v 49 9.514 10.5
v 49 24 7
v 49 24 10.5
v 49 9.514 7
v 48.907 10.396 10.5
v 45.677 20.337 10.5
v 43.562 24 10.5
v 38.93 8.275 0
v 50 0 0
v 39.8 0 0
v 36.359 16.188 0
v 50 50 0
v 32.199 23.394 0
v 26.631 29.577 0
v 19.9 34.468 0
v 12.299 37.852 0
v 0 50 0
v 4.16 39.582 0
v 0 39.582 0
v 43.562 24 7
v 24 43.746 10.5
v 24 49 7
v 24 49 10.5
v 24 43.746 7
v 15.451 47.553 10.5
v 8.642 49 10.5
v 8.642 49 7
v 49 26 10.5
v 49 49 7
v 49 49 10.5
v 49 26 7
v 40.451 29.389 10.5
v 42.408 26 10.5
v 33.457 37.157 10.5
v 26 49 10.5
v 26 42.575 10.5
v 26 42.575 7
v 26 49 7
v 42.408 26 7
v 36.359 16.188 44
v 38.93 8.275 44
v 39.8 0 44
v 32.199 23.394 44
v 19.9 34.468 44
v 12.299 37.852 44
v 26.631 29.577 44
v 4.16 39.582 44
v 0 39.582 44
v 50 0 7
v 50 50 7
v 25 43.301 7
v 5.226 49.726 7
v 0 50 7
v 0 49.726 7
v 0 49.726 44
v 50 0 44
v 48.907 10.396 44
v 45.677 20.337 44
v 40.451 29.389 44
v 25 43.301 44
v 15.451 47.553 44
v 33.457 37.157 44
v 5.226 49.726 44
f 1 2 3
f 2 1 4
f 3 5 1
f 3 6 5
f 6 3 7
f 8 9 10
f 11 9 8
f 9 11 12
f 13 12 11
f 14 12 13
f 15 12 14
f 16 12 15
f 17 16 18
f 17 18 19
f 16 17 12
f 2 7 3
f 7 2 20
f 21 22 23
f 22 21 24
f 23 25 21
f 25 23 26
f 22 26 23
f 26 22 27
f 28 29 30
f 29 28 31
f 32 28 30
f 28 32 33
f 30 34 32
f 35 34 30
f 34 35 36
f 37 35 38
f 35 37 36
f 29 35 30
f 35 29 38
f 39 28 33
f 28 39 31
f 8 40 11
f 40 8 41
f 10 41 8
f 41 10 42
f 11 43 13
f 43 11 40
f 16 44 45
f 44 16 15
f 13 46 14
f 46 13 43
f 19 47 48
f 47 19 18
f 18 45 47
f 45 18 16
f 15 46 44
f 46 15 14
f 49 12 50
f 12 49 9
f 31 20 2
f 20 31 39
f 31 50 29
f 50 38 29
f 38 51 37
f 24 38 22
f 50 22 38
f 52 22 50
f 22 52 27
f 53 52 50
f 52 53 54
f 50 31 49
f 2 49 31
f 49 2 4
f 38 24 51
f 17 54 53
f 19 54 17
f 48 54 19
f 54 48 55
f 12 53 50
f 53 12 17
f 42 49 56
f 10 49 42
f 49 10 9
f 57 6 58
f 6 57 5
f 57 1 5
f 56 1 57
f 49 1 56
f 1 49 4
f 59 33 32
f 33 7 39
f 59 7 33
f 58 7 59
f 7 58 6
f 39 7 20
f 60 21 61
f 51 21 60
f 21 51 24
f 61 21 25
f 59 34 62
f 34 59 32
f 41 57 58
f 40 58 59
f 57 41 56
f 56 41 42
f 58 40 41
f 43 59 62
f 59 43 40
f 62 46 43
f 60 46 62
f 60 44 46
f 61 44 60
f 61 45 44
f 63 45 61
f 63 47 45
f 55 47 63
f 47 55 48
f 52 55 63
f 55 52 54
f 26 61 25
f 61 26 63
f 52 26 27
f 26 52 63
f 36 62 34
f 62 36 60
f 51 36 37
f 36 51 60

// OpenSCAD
color("LightGray") {
    difference () {
        union() {
            translate([1,1,0]) cube([23,23,6+4.5]);
            translate([25+1,1,0]) cube([23,23,6+4.5]);
            translate([1,25+1,0]) cube([23,23,6+4.5]);
            translate([25+1,25+1,0]) cube([23,23,6+4.5]);
        }
        translate([0,0,-1]) cylinder(50,50-10.2,50-10.2);
    }
}
color("Grey") {
    difference() {
        cube([50,50,7]);
        translate([0,0,-1]) cylinder(50,50-10.2,50-10.2);
    }
    intersection() {
        difference() {
            cylinder(50-6,50,50);
            translate([0,0,-1]) cylinder(52,50-10.2,50-10.2);
        }
        cube([50,50,50]);
    }
}
